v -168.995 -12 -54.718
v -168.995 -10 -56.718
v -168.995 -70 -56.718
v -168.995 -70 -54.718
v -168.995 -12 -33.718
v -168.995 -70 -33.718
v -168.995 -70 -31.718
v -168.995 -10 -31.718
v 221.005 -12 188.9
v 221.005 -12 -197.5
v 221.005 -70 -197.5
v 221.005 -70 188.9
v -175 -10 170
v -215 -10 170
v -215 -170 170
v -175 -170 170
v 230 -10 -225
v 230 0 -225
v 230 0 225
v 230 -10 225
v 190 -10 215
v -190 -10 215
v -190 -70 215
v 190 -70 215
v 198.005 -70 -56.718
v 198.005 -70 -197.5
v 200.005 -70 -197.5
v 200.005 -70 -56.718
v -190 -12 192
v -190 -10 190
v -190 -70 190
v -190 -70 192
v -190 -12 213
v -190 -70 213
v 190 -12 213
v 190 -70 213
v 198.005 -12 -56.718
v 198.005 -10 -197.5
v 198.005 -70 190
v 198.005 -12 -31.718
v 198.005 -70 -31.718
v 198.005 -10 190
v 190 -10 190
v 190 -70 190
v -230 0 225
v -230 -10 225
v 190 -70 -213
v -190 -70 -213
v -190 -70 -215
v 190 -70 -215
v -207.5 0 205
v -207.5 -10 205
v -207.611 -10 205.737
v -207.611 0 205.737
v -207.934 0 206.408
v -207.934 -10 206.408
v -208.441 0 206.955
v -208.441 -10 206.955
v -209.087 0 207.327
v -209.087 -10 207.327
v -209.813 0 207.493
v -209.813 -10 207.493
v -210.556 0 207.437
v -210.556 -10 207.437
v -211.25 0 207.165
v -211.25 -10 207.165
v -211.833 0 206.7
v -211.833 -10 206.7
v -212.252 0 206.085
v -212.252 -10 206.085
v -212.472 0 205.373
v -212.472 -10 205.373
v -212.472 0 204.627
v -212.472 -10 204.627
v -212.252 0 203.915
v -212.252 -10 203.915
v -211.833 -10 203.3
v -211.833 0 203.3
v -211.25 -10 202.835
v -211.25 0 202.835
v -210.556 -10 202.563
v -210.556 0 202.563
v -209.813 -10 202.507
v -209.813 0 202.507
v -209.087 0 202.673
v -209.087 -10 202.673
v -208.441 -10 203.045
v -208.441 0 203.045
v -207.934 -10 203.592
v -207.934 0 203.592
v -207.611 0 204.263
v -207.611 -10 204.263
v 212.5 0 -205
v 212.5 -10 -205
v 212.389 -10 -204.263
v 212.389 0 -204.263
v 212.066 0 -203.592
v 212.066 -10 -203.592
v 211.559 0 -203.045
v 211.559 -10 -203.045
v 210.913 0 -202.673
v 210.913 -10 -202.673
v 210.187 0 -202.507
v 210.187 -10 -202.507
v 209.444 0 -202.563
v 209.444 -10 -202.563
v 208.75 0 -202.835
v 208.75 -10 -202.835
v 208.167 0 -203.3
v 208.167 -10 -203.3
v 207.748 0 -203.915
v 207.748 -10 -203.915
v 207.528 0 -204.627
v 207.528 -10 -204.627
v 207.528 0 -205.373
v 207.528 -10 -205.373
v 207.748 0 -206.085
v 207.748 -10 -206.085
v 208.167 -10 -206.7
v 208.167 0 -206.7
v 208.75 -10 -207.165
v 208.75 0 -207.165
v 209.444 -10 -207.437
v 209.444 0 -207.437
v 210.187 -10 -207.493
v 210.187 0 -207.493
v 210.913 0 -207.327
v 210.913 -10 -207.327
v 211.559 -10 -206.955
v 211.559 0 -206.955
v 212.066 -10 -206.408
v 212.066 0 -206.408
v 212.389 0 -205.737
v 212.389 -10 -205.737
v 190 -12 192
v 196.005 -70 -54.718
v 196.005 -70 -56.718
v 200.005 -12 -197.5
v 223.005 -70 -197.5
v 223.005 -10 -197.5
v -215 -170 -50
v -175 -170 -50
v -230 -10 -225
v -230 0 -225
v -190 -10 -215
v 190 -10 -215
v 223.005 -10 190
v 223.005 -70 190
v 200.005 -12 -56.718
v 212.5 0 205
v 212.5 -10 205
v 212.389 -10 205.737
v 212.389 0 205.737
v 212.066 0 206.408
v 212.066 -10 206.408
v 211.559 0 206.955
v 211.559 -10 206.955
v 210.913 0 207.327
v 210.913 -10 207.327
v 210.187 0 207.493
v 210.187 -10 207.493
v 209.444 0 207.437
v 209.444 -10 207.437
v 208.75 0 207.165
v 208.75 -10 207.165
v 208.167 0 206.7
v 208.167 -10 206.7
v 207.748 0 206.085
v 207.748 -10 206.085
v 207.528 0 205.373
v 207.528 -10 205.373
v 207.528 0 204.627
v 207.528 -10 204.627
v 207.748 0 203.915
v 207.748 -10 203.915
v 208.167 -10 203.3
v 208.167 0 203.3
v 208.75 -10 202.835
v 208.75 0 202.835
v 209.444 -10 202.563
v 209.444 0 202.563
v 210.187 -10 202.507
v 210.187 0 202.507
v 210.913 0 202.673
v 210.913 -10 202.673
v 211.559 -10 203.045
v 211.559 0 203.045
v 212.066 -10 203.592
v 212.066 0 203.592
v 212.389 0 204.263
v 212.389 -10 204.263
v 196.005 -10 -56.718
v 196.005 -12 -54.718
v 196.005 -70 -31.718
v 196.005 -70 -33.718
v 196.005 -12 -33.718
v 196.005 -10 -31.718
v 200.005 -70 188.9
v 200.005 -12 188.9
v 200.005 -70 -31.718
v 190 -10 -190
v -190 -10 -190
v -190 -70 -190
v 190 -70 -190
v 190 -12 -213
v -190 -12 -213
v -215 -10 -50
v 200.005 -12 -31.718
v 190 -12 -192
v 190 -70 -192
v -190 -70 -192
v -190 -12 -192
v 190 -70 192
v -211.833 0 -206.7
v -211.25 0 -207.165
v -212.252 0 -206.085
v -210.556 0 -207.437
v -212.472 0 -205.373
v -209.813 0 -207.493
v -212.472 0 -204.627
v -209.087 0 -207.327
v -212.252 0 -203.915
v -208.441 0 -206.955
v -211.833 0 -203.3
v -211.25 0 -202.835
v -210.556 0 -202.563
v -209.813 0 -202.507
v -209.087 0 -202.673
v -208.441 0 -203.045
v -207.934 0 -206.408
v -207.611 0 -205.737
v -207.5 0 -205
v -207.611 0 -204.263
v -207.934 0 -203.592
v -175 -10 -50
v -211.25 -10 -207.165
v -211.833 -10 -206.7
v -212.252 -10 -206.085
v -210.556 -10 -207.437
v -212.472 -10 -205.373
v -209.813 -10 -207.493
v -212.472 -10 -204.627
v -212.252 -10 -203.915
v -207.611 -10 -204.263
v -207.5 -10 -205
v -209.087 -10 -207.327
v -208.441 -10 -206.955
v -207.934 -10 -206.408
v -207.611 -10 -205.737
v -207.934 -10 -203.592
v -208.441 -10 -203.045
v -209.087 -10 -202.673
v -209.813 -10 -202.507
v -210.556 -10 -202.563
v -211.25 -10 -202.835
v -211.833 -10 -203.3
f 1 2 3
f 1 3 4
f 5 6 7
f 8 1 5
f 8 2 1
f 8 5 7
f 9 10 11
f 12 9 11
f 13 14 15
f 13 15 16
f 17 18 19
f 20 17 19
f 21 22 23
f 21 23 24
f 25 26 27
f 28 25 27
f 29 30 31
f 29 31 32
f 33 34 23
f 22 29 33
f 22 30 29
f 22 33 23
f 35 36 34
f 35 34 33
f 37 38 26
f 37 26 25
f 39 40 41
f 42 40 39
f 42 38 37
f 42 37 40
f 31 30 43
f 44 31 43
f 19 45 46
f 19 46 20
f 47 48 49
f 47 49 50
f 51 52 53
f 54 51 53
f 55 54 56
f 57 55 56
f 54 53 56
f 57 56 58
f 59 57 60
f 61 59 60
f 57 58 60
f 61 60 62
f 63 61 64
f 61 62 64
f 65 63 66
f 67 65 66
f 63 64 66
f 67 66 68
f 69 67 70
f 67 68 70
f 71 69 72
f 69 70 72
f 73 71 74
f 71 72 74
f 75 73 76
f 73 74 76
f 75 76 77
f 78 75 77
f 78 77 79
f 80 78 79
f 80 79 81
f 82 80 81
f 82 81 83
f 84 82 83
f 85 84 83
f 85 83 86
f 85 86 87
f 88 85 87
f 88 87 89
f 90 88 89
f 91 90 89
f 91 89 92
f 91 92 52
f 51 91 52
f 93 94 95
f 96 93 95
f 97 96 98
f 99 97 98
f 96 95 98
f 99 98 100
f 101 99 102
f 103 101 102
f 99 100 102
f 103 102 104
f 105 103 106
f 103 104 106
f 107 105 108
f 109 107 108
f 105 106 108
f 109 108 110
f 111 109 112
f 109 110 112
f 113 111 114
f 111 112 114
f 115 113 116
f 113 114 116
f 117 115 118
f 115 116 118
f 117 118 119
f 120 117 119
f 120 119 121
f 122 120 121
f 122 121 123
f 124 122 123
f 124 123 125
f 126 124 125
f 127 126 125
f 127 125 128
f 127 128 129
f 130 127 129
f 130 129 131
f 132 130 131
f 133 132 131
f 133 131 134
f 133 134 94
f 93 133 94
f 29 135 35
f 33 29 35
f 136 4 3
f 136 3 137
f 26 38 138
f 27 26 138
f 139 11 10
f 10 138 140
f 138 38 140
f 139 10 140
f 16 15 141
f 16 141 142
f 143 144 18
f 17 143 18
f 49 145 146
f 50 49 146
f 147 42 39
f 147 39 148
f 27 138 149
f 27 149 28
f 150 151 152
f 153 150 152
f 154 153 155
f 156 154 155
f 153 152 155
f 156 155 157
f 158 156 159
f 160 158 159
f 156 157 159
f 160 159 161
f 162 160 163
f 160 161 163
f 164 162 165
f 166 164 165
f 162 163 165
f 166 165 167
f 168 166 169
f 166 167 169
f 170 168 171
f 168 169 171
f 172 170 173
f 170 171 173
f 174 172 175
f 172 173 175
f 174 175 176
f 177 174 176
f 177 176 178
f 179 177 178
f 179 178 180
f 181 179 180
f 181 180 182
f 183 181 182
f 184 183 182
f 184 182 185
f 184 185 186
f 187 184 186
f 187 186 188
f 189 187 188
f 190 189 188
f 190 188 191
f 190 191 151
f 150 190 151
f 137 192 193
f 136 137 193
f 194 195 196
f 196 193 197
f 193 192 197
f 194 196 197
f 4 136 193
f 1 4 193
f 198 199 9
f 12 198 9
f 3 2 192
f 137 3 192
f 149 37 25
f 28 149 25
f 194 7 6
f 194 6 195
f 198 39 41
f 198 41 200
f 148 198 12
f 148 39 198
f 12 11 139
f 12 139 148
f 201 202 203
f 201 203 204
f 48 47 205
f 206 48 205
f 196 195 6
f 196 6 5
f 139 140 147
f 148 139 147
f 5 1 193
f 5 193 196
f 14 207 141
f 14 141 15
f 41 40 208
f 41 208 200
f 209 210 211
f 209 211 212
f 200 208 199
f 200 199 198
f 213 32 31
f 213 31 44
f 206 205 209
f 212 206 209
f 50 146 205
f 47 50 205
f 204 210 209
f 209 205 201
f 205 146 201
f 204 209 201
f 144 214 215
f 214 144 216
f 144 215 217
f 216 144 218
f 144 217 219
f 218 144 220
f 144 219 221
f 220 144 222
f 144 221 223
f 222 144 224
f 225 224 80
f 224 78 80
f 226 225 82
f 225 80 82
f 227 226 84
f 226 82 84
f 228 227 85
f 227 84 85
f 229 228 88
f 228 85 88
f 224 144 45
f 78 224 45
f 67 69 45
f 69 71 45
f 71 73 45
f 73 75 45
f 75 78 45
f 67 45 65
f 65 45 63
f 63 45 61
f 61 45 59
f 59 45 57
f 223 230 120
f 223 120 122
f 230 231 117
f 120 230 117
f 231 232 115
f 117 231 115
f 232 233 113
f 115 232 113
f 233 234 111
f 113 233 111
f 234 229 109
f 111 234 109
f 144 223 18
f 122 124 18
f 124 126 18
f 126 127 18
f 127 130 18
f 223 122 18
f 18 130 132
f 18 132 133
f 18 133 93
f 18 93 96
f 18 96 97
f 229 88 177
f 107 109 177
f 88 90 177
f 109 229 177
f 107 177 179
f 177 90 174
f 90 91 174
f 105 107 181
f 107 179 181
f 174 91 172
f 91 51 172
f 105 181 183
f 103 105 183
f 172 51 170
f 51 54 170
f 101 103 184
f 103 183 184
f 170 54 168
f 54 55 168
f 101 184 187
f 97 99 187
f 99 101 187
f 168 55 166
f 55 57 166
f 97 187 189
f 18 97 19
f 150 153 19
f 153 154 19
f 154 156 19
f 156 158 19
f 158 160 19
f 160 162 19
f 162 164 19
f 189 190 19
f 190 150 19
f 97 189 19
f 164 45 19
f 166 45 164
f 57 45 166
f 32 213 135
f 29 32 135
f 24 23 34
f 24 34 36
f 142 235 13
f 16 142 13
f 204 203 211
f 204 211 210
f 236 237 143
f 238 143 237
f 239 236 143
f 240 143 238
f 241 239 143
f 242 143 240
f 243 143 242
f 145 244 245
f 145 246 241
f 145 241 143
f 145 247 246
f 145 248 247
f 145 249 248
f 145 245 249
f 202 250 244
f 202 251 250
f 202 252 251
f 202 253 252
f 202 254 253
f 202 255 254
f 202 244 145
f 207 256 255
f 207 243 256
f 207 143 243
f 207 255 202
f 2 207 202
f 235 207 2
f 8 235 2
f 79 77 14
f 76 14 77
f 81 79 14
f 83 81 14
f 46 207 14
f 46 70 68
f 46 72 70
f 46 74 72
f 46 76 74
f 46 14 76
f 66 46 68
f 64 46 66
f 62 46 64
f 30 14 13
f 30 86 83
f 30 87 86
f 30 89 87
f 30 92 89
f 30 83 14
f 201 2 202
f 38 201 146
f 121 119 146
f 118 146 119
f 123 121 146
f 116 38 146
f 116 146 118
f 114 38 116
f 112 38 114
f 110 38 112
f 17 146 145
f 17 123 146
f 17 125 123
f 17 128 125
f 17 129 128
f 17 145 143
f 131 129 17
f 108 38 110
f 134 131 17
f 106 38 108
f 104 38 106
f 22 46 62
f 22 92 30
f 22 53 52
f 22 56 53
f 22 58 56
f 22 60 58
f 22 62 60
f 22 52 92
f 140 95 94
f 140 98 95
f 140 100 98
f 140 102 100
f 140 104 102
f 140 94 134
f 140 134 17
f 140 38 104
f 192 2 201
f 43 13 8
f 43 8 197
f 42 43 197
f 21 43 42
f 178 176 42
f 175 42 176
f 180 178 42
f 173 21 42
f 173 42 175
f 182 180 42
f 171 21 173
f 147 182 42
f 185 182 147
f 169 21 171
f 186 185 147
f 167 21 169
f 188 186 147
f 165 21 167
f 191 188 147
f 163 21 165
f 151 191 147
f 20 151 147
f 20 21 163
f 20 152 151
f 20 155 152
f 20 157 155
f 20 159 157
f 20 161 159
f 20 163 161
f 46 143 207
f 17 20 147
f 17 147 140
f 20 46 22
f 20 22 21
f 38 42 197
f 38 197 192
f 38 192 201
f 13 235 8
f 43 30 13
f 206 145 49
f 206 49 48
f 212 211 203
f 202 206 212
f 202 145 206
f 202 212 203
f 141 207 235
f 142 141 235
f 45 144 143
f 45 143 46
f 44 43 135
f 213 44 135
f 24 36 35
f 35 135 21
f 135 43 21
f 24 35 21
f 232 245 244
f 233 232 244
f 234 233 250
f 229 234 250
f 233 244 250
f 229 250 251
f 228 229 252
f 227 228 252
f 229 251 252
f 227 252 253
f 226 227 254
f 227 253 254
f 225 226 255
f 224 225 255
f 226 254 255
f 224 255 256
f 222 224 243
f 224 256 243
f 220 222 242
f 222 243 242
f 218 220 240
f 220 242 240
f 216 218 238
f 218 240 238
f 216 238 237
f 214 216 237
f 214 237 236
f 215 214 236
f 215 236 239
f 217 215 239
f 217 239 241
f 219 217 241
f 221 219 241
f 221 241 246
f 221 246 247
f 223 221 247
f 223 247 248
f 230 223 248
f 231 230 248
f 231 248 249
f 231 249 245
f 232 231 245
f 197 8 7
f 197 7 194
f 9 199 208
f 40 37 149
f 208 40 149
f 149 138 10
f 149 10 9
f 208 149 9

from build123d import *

# Parameters (mm, degrees)
F0_W      = 460
F0_H      = 450
F1_DEPTH  = 10
F2_R      = 2.5
F3_DEPTH  = 23
F4_W      = 40
F4_H      = 220
F5_DEPTH  = 160
F6_W      = 380
F6_H      = 25
F7_DEPTH  = 60
F8_W      = 58
F8_H      = 21
F9_DEPTH  = 382.2
F10_DEPTH = 401
F11_W     = 25
F11_H     = 387.5
F12_DEPTH = 60
F13_W     = 21
F13_H     = 58
F14_DEPTH = 386.4
F15_W     = 58
F15_H     = 25
F16_DEPTH = 3.3
F17_W     = 365
F17_H     = 25
F18_DEPTH = 60
F19_W     = 58
F19_H     = 21
F20_DEPTH = 366.6


with BuildPart() as f1:
    # F0 (on Front) → F1 (new body)
    with BuildSketch(Plane.XZ):
        Rectangle(F0_W, F0_H)
    extrude(amount=F1_DEPTH)

    # F2 (on face) → F3 (cut)
    with BuildSketch(Plane.XZ.offset(10)):
        with Locations((210, 205)):
            Circle(F2_R)
        with Locations((-210, 205)):
            Circle(F2_R)
        with Locations((-210, -205)):
            Circle(F2_R)
        with Locations((210, -205)):
            Circle(F2_R)
    extrude(amount=-F3_DEPTH, mode=Mode.SUBTRACT)

    # F4 (on face) → F5 (join)
    with BuildSketch(Plane.XZ.offset(10)):
        with Locations((-195, 60)):
            Rectangle(F4_W, F4_H)
    extrude(amount=F5_DEPTH)

    # F6 (on face) → F7 (join)
    with BuildSketch(Plane.XZ.offset(10)):
        with Locations((0, 202.5)):
            Rectangle(F6_W, F6_H)
        with Locations((0, -202.5)):
            Rectangle(F6_W, F6_H)
    extrude(amount=F7_DEPTH)

    # F8 (on face) → F9 (cut)
    with BuildSketch(Plane.YZ.offset(190)):
        with Locations((-41, 202.5)):
            Rectangle(F8_W, F8_H)
    extrude(amount=-F9_DEPTH, mode=Mode.SUBTRACT)

    # F8 (on face) → F10 (cut)
    with BuildSketch(Plane.YZ.offset(190)):
        with Locations((-41, -202.5)):
            Rectangle(F8_W, F8_H)
    extrude(amount=-F10_DEPTH, mode=Mode.SUBTRACT)

    # F11 (on face) → F12 (join)
    with BuildSketch(Plane.XZ.offset(10)):
        with Locations((210.504704, -3.75)):
            Rectangle(F11_W, F11_H)
    extrude(amount=F12_DEPTH)

    # F13 (on face) → F14 (cut)
    with BuildSketch(Plane(origin=(0, 0, -197.5), x_dir=(1, 0, 0), z_dir=(0, 0, -1))):
        with Locations((210.504704, 41)):
            Rectangle(F13_W, F13_H)
    extrude(amount=-F14_DEPTH, mode=Mode.SUBTRACT)

    # F15 (on face) → F16 (cut)
    with BuildSketch(Plane(origin=(198.004704, 0, 0), x_dir=(0, -1, 0), z_dir=(-1, 0, 0))):
        with Locations((41, -44.218161)):
            Rectangle(F15_W, F15_H)
    extrude(amount=-F16_DEPTH, mode=Mode.SUBTRACT)

    # F17 (on face) → F18 (join)
    with BuildSketch(Plane.XZ.offset(10)):
        with Locations((13.504704, -44.218161)):
            Rectangle(F17_W, F17_H)
    extrude(amount=F18_DEPTH)

    # F19 (on face) → F20 (cut)
    with BuildSketch(Plane.YZ.offset(196.004704)):
        with Locations((-41, -44.218161)):
            Rectangle(F19_W, F19_H)
    extrude(amount=-F20_DEPTH, mode=Mode.SUBTRACT)


solid = f1.part
